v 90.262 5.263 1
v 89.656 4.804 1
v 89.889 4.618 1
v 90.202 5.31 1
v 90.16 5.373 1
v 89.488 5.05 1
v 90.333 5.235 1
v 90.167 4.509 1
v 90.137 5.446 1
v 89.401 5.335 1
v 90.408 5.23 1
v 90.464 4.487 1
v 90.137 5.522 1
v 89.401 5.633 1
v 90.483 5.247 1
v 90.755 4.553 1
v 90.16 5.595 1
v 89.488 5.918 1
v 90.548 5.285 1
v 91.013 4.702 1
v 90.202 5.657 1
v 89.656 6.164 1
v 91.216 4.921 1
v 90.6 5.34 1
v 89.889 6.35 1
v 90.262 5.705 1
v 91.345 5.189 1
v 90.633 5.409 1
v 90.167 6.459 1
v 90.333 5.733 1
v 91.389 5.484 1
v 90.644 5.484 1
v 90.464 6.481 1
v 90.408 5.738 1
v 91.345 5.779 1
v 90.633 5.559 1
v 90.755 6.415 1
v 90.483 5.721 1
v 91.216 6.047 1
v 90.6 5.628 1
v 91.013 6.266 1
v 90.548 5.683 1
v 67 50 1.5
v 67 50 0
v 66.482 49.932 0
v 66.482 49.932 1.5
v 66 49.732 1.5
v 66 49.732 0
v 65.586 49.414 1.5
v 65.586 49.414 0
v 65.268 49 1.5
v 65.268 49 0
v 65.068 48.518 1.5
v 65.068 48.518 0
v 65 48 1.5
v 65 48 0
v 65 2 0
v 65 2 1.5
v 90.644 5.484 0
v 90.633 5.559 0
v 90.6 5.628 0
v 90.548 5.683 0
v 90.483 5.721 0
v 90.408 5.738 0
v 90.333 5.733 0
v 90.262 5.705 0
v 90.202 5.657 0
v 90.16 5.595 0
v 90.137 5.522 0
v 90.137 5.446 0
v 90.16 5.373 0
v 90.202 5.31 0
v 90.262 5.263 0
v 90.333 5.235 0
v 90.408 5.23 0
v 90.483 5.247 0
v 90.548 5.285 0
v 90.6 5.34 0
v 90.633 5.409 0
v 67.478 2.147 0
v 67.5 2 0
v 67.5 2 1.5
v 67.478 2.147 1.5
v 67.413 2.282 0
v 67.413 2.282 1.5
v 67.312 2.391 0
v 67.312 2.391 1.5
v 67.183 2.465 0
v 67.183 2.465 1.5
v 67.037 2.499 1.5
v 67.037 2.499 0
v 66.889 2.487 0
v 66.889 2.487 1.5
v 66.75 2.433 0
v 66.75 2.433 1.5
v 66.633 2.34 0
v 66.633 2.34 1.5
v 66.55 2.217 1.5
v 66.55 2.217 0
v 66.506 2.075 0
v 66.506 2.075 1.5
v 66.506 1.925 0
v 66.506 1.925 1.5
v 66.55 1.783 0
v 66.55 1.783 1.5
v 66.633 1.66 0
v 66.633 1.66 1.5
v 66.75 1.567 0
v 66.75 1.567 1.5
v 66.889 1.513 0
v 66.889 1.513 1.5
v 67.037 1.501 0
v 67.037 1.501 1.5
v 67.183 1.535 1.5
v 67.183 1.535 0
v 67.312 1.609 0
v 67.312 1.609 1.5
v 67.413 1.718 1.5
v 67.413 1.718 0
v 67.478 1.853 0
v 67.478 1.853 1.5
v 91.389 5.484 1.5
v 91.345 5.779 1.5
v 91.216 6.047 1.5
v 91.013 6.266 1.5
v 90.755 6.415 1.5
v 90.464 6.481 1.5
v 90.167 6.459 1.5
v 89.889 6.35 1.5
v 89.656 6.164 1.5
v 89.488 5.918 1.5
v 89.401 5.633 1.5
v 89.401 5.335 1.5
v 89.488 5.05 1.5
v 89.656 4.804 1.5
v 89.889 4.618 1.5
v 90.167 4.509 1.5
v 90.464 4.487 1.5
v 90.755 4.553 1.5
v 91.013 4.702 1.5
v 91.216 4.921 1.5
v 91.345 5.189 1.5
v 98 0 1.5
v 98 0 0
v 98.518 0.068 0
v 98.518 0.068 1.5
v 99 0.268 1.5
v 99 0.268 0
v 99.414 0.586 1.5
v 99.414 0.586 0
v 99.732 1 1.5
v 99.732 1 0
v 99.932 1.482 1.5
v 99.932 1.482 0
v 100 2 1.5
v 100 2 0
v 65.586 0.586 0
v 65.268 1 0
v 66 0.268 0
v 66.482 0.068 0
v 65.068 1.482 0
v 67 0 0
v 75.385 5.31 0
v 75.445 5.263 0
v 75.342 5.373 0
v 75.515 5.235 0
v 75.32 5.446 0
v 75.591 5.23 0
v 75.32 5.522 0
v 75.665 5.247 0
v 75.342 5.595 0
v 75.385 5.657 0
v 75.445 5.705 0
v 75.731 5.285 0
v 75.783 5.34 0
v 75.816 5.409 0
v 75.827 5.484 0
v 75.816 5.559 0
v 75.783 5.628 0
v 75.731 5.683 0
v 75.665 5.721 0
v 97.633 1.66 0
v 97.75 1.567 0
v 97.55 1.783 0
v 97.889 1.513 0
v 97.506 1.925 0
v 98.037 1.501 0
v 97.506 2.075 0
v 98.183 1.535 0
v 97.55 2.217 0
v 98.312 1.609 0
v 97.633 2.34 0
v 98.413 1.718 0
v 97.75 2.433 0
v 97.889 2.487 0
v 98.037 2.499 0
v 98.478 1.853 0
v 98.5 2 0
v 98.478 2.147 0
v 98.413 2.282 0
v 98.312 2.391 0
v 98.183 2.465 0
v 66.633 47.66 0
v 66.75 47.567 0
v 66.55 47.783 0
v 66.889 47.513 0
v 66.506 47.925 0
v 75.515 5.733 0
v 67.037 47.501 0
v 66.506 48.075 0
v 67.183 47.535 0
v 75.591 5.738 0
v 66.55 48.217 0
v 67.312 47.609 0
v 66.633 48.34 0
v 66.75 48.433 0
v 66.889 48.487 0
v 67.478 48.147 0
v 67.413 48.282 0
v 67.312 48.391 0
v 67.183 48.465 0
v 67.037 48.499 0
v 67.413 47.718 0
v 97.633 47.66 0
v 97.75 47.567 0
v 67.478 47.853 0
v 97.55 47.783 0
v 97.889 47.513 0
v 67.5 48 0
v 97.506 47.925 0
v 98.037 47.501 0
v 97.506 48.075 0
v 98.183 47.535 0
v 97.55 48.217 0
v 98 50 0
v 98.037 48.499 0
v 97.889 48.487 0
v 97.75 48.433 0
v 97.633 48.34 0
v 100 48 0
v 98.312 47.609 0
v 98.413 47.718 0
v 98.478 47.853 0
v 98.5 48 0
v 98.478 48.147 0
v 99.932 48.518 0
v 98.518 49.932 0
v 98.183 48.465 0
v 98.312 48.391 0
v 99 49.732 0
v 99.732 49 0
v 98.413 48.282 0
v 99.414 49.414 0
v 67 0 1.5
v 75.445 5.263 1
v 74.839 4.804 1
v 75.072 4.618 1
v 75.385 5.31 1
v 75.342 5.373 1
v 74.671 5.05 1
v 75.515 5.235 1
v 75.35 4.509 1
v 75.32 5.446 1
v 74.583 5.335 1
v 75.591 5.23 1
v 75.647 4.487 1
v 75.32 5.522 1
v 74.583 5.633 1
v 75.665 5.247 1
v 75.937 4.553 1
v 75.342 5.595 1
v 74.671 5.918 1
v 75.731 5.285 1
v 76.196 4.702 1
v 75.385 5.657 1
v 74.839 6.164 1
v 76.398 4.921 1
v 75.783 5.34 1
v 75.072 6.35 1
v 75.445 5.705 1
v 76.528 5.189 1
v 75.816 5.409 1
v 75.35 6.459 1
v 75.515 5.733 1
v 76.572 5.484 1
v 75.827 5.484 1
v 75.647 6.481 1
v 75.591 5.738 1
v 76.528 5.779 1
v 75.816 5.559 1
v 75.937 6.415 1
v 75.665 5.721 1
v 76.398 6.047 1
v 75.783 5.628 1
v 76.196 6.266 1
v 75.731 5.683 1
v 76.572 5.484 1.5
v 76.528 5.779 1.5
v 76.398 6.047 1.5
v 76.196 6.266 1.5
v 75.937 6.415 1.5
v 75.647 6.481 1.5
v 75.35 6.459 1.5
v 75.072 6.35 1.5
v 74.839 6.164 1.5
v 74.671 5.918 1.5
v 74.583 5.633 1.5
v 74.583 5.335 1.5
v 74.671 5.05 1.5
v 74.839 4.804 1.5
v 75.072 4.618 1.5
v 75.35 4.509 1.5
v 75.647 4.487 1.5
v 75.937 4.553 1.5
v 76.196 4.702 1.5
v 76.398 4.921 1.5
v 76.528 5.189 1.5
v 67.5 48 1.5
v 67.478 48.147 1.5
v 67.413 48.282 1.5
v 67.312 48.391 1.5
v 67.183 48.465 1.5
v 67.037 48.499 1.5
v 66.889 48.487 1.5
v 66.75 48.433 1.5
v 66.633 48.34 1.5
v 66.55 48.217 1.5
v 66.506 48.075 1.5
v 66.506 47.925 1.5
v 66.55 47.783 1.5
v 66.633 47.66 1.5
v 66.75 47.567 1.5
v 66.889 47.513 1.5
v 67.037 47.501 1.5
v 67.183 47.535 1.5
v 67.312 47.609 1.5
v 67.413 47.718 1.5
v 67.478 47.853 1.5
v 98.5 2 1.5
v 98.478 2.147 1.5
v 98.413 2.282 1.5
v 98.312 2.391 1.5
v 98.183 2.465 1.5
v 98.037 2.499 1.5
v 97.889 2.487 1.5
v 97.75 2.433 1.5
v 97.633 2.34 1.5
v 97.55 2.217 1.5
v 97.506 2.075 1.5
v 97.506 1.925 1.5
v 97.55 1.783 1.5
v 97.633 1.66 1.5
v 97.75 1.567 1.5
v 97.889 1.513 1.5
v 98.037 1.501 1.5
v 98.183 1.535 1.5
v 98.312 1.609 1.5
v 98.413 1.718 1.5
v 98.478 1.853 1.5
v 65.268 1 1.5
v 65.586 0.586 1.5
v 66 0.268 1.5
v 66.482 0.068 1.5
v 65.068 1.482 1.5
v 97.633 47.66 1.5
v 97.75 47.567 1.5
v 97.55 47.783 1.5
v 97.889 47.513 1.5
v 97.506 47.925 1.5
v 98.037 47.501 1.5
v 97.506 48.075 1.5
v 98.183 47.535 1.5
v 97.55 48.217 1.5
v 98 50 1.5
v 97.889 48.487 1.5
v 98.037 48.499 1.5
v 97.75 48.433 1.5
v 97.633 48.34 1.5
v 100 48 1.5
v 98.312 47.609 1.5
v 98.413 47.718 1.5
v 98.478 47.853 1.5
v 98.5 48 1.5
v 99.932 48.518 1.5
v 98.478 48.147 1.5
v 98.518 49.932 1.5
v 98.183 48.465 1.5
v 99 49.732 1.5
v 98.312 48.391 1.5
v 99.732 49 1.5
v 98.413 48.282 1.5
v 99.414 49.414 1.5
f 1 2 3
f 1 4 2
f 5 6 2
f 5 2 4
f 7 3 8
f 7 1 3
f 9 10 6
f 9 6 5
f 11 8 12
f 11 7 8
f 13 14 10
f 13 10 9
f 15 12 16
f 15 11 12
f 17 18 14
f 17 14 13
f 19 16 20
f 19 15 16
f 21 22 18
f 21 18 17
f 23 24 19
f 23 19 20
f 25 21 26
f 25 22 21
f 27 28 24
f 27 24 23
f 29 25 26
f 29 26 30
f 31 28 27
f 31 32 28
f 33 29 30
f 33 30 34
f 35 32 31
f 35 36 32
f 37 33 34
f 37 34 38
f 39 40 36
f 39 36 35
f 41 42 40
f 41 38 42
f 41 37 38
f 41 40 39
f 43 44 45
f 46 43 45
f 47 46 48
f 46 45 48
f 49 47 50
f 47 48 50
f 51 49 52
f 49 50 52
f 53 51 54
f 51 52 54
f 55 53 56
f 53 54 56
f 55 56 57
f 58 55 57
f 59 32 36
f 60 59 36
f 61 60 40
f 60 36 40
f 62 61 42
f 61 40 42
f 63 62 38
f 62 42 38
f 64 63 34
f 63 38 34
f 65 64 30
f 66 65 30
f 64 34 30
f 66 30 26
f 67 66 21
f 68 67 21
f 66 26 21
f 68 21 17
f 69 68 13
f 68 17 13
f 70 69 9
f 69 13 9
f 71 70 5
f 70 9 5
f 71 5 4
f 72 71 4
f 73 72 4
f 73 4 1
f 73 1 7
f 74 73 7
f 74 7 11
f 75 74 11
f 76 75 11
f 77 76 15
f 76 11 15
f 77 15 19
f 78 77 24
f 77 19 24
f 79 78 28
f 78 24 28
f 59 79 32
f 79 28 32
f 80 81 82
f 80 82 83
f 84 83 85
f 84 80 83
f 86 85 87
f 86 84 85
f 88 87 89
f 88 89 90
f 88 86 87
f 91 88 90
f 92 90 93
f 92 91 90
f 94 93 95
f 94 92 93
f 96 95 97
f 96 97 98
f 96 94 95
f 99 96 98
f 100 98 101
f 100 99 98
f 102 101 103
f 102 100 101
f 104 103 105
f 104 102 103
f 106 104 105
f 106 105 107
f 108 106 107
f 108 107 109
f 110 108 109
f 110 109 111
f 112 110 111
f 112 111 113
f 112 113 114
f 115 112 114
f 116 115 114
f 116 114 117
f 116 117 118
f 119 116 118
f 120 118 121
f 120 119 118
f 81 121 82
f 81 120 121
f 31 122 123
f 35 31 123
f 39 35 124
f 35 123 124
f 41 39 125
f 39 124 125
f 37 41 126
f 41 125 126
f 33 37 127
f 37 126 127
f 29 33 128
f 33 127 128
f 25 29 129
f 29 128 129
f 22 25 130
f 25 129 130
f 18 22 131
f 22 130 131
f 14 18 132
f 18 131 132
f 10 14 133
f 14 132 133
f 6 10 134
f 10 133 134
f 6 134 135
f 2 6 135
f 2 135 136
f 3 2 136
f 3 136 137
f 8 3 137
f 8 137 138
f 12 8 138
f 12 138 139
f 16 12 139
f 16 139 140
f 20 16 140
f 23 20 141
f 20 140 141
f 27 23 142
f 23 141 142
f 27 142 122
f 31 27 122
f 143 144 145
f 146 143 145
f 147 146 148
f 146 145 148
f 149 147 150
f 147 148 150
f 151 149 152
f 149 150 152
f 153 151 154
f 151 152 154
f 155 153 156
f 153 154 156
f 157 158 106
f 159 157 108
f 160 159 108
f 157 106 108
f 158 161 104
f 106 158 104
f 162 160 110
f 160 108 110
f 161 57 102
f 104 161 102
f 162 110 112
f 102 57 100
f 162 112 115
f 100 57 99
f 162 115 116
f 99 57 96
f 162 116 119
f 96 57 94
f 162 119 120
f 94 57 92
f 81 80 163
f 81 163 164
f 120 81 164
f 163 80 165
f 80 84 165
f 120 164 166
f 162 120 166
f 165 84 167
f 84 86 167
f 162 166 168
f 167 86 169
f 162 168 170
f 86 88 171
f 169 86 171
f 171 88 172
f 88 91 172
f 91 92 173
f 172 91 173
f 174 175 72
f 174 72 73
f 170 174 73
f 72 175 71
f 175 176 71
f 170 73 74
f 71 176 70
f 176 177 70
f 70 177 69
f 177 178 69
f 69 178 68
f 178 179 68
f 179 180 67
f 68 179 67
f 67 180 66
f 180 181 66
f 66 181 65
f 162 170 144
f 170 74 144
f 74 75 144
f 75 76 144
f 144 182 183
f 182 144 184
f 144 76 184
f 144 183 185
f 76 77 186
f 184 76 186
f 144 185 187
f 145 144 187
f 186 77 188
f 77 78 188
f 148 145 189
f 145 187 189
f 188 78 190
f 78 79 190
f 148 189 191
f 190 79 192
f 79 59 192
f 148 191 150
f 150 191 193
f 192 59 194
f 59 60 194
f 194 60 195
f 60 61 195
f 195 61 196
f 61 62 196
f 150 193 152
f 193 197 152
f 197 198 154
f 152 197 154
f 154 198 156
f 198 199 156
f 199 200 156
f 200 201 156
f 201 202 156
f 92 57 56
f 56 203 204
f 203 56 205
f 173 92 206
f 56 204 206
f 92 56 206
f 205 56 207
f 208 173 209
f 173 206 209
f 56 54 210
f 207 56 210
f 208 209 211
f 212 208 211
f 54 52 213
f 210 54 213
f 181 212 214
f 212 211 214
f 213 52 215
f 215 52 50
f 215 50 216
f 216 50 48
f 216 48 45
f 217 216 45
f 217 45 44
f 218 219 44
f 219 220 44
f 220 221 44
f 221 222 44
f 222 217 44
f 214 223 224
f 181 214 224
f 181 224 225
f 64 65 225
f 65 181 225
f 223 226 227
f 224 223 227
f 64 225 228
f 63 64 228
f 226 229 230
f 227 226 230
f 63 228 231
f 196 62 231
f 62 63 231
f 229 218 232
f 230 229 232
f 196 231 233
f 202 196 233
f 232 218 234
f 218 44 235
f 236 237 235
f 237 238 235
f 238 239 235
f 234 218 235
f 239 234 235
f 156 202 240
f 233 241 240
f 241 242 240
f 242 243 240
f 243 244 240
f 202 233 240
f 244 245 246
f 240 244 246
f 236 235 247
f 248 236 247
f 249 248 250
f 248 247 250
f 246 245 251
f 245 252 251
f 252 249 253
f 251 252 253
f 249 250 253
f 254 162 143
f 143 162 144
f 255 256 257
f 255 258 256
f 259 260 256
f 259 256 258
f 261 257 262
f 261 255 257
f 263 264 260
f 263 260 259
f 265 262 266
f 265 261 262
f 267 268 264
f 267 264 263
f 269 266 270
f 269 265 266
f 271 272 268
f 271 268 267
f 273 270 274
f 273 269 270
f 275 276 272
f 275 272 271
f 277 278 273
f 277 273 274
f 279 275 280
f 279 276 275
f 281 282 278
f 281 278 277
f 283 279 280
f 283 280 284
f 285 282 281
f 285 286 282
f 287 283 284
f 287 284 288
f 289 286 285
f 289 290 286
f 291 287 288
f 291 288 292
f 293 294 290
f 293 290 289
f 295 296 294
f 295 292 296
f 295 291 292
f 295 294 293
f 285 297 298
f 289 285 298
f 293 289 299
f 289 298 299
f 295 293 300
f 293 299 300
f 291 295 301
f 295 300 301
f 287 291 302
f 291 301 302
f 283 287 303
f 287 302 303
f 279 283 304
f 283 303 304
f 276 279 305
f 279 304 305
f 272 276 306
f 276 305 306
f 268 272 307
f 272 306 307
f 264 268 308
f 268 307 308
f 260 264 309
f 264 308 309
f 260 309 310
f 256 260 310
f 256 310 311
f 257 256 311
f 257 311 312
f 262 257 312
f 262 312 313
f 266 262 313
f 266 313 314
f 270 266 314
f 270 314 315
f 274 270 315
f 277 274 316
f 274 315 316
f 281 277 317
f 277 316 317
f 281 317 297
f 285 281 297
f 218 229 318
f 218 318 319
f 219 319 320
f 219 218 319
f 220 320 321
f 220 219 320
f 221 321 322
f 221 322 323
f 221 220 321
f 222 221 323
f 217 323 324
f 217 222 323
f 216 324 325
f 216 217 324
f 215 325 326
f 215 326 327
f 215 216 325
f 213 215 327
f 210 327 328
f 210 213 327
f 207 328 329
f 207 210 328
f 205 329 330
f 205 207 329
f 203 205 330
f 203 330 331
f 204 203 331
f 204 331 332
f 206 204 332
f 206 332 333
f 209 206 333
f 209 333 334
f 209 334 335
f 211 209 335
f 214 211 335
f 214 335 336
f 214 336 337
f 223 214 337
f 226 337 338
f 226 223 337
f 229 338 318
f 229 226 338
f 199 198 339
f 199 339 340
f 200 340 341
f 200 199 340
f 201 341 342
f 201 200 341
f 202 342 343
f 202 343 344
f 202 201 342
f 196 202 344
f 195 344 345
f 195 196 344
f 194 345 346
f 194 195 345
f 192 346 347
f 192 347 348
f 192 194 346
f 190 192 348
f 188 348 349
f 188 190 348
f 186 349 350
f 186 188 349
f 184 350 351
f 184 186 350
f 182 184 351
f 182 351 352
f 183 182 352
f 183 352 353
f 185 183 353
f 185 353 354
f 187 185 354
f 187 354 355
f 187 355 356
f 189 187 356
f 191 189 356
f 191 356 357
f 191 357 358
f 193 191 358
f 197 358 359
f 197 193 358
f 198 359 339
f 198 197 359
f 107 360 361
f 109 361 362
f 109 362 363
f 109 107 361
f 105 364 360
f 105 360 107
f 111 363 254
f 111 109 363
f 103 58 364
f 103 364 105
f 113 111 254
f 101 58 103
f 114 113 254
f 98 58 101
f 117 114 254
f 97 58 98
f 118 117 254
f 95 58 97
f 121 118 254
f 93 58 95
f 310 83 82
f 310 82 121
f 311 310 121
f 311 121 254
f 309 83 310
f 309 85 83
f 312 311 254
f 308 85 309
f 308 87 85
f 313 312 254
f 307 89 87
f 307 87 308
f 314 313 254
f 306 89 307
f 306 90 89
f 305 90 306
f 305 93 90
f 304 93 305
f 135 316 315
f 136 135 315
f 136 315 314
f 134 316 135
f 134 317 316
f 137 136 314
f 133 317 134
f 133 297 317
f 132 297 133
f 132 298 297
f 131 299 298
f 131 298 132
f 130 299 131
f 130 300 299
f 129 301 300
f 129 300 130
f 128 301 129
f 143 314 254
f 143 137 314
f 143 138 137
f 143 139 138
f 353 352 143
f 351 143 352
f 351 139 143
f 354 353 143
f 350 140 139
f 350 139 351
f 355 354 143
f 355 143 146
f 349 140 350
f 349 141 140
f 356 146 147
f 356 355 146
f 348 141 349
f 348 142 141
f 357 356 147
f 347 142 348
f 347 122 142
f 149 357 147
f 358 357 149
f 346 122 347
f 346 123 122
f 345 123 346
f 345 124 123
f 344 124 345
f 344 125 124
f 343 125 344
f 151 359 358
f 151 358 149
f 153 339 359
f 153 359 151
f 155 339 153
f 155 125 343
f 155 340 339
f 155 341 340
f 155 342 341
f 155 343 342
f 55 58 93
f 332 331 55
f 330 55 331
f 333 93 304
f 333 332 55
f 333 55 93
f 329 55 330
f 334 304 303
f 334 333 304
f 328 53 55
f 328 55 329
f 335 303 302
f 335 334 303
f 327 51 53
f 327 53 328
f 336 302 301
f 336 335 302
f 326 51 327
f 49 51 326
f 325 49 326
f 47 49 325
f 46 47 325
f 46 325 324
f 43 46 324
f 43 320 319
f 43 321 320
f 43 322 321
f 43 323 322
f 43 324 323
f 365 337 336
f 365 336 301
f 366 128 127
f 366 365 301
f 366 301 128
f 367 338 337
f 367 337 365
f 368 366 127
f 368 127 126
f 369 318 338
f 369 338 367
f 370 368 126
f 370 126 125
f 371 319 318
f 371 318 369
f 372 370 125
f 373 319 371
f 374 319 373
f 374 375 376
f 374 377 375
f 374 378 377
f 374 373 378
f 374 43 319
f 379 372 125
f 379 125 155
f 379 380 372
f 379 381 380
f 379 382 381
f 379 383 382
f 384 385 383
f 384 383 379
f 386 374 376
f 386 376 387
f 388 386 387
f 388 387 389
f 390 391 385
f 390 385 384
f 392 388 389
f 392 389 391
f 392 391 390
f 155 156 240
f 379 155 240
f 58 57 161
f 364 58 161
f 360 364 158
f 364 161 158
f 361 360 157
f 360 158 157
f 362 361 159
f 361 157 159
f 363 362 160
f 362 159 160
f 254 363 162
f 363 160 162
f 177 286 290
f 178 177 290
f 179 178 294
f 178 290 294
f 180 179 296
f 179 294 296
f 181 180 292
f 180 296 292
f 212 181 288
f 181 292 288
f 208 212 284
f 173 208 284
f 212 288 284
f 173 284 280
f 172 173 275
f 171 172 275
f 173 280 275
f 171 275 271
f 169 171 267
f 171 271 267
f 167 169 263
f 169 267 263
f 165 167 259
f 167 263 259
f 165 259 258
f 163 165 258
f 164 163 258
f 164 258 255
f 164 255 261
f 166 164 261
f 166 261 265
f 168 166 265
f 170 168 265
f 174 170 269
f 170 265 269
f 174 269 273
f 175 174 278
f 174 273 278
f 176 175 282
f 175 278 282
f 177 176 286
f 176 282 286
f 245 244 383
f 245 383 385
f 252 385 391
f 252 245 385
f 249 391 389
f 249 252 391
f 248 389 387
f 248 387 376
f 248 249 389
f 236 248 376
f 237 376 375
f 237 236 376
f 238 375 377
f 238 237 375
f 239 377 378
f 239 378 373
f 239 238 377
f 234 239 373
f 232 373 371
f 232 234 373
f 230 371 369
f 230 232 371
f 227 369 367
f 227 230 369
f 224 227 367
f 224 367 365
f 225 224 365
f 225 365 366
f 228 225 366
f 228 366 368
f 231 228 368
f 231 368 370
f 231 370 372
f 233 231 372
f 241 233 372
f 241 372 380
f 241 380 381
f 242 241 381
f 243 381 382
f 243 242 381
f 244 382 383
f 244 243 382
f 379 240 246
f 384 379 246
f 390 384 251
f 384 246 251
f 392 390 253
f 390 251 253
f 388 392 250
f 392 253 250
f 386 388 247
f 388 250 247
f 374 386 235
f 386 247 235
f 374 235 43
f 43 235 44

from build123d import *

# Parameters (mm, degrees)
F0_R     = 0.5
F1_DEPTH = 1.5
F2_R     = 1
F3_DEPTH = 0.5
F4_R     = 0.255
F5_DEPTH = 1
F6_R     = 0.255
F7_DEPTH = 1


with BuildPart() as f1:
    # F0 (on Top) → F1 (new body)
    with BuildSketch(Plane.XY):
        with BuildLine():
            ThreePointArc((65, 2), (65.585786, 0.585786), (67, 0))
            Line((67, 0), (98, 0))
            ThreePointArc((98, 0), (99.414214, 0.585786), (100, 2))
            Line((100, 2), (100, 48))
            ThreePointArc((100, 48), (99.414214, 49.414214), (98, 50))
            Line((98, 50), (67, 50))
            ThreePointArc((67, 50), (65.585786, 49.414214), (65, 48))
            Line((65, 48), (65, 2))
        make_face()
        with Locations((67, 2)):
            Circle(F0_R, mode=Mode.SUBTRACT)
        with Locations((98, 2)):
            Circle(F0_R, mode=Mode.SUBTRACT)
        with Locations((67, 48)):
            Circle(F0_R, mode=Mode.SUBTRACT)
        with Locations((98, 48)):
            Circle(F0_R, mode=Mode.SUBTRACT)
    extrude(amount=F1_DEPTH)

    # F2 (on face) → F3 (cut)
    with BuildSketch(Plane.XY.offset(1.5)):
        with Locations((90.389371, 5.483904)):
            Circle(F2_R)
        with Locations((75.572118, 5.483904)):
            Circle(F2_R)
    extrude(amount=-F3_DEPTH, mode=Mode.SUBTRACT)

    # F4 (on face) → F5 (cut)
    with BuildSketch(Plane.XY.offset(1)):
        with Locations((90.389371, 5.483904)):
            Circle(F4_R)
    extrude(amount=-F5_DEPTH, mode=Mode.SUBTRACT)

    # F6 (on face) → F7 (cut)
    with BuildSketch(Plane.XY.offset(1)):
        with Locations((75.572118, 5.483904)):
            Circle(F6_R)
    extrude(amount=-F7_DEPTH, mode=Mode.SUBTRACT)


solid = f1.part
